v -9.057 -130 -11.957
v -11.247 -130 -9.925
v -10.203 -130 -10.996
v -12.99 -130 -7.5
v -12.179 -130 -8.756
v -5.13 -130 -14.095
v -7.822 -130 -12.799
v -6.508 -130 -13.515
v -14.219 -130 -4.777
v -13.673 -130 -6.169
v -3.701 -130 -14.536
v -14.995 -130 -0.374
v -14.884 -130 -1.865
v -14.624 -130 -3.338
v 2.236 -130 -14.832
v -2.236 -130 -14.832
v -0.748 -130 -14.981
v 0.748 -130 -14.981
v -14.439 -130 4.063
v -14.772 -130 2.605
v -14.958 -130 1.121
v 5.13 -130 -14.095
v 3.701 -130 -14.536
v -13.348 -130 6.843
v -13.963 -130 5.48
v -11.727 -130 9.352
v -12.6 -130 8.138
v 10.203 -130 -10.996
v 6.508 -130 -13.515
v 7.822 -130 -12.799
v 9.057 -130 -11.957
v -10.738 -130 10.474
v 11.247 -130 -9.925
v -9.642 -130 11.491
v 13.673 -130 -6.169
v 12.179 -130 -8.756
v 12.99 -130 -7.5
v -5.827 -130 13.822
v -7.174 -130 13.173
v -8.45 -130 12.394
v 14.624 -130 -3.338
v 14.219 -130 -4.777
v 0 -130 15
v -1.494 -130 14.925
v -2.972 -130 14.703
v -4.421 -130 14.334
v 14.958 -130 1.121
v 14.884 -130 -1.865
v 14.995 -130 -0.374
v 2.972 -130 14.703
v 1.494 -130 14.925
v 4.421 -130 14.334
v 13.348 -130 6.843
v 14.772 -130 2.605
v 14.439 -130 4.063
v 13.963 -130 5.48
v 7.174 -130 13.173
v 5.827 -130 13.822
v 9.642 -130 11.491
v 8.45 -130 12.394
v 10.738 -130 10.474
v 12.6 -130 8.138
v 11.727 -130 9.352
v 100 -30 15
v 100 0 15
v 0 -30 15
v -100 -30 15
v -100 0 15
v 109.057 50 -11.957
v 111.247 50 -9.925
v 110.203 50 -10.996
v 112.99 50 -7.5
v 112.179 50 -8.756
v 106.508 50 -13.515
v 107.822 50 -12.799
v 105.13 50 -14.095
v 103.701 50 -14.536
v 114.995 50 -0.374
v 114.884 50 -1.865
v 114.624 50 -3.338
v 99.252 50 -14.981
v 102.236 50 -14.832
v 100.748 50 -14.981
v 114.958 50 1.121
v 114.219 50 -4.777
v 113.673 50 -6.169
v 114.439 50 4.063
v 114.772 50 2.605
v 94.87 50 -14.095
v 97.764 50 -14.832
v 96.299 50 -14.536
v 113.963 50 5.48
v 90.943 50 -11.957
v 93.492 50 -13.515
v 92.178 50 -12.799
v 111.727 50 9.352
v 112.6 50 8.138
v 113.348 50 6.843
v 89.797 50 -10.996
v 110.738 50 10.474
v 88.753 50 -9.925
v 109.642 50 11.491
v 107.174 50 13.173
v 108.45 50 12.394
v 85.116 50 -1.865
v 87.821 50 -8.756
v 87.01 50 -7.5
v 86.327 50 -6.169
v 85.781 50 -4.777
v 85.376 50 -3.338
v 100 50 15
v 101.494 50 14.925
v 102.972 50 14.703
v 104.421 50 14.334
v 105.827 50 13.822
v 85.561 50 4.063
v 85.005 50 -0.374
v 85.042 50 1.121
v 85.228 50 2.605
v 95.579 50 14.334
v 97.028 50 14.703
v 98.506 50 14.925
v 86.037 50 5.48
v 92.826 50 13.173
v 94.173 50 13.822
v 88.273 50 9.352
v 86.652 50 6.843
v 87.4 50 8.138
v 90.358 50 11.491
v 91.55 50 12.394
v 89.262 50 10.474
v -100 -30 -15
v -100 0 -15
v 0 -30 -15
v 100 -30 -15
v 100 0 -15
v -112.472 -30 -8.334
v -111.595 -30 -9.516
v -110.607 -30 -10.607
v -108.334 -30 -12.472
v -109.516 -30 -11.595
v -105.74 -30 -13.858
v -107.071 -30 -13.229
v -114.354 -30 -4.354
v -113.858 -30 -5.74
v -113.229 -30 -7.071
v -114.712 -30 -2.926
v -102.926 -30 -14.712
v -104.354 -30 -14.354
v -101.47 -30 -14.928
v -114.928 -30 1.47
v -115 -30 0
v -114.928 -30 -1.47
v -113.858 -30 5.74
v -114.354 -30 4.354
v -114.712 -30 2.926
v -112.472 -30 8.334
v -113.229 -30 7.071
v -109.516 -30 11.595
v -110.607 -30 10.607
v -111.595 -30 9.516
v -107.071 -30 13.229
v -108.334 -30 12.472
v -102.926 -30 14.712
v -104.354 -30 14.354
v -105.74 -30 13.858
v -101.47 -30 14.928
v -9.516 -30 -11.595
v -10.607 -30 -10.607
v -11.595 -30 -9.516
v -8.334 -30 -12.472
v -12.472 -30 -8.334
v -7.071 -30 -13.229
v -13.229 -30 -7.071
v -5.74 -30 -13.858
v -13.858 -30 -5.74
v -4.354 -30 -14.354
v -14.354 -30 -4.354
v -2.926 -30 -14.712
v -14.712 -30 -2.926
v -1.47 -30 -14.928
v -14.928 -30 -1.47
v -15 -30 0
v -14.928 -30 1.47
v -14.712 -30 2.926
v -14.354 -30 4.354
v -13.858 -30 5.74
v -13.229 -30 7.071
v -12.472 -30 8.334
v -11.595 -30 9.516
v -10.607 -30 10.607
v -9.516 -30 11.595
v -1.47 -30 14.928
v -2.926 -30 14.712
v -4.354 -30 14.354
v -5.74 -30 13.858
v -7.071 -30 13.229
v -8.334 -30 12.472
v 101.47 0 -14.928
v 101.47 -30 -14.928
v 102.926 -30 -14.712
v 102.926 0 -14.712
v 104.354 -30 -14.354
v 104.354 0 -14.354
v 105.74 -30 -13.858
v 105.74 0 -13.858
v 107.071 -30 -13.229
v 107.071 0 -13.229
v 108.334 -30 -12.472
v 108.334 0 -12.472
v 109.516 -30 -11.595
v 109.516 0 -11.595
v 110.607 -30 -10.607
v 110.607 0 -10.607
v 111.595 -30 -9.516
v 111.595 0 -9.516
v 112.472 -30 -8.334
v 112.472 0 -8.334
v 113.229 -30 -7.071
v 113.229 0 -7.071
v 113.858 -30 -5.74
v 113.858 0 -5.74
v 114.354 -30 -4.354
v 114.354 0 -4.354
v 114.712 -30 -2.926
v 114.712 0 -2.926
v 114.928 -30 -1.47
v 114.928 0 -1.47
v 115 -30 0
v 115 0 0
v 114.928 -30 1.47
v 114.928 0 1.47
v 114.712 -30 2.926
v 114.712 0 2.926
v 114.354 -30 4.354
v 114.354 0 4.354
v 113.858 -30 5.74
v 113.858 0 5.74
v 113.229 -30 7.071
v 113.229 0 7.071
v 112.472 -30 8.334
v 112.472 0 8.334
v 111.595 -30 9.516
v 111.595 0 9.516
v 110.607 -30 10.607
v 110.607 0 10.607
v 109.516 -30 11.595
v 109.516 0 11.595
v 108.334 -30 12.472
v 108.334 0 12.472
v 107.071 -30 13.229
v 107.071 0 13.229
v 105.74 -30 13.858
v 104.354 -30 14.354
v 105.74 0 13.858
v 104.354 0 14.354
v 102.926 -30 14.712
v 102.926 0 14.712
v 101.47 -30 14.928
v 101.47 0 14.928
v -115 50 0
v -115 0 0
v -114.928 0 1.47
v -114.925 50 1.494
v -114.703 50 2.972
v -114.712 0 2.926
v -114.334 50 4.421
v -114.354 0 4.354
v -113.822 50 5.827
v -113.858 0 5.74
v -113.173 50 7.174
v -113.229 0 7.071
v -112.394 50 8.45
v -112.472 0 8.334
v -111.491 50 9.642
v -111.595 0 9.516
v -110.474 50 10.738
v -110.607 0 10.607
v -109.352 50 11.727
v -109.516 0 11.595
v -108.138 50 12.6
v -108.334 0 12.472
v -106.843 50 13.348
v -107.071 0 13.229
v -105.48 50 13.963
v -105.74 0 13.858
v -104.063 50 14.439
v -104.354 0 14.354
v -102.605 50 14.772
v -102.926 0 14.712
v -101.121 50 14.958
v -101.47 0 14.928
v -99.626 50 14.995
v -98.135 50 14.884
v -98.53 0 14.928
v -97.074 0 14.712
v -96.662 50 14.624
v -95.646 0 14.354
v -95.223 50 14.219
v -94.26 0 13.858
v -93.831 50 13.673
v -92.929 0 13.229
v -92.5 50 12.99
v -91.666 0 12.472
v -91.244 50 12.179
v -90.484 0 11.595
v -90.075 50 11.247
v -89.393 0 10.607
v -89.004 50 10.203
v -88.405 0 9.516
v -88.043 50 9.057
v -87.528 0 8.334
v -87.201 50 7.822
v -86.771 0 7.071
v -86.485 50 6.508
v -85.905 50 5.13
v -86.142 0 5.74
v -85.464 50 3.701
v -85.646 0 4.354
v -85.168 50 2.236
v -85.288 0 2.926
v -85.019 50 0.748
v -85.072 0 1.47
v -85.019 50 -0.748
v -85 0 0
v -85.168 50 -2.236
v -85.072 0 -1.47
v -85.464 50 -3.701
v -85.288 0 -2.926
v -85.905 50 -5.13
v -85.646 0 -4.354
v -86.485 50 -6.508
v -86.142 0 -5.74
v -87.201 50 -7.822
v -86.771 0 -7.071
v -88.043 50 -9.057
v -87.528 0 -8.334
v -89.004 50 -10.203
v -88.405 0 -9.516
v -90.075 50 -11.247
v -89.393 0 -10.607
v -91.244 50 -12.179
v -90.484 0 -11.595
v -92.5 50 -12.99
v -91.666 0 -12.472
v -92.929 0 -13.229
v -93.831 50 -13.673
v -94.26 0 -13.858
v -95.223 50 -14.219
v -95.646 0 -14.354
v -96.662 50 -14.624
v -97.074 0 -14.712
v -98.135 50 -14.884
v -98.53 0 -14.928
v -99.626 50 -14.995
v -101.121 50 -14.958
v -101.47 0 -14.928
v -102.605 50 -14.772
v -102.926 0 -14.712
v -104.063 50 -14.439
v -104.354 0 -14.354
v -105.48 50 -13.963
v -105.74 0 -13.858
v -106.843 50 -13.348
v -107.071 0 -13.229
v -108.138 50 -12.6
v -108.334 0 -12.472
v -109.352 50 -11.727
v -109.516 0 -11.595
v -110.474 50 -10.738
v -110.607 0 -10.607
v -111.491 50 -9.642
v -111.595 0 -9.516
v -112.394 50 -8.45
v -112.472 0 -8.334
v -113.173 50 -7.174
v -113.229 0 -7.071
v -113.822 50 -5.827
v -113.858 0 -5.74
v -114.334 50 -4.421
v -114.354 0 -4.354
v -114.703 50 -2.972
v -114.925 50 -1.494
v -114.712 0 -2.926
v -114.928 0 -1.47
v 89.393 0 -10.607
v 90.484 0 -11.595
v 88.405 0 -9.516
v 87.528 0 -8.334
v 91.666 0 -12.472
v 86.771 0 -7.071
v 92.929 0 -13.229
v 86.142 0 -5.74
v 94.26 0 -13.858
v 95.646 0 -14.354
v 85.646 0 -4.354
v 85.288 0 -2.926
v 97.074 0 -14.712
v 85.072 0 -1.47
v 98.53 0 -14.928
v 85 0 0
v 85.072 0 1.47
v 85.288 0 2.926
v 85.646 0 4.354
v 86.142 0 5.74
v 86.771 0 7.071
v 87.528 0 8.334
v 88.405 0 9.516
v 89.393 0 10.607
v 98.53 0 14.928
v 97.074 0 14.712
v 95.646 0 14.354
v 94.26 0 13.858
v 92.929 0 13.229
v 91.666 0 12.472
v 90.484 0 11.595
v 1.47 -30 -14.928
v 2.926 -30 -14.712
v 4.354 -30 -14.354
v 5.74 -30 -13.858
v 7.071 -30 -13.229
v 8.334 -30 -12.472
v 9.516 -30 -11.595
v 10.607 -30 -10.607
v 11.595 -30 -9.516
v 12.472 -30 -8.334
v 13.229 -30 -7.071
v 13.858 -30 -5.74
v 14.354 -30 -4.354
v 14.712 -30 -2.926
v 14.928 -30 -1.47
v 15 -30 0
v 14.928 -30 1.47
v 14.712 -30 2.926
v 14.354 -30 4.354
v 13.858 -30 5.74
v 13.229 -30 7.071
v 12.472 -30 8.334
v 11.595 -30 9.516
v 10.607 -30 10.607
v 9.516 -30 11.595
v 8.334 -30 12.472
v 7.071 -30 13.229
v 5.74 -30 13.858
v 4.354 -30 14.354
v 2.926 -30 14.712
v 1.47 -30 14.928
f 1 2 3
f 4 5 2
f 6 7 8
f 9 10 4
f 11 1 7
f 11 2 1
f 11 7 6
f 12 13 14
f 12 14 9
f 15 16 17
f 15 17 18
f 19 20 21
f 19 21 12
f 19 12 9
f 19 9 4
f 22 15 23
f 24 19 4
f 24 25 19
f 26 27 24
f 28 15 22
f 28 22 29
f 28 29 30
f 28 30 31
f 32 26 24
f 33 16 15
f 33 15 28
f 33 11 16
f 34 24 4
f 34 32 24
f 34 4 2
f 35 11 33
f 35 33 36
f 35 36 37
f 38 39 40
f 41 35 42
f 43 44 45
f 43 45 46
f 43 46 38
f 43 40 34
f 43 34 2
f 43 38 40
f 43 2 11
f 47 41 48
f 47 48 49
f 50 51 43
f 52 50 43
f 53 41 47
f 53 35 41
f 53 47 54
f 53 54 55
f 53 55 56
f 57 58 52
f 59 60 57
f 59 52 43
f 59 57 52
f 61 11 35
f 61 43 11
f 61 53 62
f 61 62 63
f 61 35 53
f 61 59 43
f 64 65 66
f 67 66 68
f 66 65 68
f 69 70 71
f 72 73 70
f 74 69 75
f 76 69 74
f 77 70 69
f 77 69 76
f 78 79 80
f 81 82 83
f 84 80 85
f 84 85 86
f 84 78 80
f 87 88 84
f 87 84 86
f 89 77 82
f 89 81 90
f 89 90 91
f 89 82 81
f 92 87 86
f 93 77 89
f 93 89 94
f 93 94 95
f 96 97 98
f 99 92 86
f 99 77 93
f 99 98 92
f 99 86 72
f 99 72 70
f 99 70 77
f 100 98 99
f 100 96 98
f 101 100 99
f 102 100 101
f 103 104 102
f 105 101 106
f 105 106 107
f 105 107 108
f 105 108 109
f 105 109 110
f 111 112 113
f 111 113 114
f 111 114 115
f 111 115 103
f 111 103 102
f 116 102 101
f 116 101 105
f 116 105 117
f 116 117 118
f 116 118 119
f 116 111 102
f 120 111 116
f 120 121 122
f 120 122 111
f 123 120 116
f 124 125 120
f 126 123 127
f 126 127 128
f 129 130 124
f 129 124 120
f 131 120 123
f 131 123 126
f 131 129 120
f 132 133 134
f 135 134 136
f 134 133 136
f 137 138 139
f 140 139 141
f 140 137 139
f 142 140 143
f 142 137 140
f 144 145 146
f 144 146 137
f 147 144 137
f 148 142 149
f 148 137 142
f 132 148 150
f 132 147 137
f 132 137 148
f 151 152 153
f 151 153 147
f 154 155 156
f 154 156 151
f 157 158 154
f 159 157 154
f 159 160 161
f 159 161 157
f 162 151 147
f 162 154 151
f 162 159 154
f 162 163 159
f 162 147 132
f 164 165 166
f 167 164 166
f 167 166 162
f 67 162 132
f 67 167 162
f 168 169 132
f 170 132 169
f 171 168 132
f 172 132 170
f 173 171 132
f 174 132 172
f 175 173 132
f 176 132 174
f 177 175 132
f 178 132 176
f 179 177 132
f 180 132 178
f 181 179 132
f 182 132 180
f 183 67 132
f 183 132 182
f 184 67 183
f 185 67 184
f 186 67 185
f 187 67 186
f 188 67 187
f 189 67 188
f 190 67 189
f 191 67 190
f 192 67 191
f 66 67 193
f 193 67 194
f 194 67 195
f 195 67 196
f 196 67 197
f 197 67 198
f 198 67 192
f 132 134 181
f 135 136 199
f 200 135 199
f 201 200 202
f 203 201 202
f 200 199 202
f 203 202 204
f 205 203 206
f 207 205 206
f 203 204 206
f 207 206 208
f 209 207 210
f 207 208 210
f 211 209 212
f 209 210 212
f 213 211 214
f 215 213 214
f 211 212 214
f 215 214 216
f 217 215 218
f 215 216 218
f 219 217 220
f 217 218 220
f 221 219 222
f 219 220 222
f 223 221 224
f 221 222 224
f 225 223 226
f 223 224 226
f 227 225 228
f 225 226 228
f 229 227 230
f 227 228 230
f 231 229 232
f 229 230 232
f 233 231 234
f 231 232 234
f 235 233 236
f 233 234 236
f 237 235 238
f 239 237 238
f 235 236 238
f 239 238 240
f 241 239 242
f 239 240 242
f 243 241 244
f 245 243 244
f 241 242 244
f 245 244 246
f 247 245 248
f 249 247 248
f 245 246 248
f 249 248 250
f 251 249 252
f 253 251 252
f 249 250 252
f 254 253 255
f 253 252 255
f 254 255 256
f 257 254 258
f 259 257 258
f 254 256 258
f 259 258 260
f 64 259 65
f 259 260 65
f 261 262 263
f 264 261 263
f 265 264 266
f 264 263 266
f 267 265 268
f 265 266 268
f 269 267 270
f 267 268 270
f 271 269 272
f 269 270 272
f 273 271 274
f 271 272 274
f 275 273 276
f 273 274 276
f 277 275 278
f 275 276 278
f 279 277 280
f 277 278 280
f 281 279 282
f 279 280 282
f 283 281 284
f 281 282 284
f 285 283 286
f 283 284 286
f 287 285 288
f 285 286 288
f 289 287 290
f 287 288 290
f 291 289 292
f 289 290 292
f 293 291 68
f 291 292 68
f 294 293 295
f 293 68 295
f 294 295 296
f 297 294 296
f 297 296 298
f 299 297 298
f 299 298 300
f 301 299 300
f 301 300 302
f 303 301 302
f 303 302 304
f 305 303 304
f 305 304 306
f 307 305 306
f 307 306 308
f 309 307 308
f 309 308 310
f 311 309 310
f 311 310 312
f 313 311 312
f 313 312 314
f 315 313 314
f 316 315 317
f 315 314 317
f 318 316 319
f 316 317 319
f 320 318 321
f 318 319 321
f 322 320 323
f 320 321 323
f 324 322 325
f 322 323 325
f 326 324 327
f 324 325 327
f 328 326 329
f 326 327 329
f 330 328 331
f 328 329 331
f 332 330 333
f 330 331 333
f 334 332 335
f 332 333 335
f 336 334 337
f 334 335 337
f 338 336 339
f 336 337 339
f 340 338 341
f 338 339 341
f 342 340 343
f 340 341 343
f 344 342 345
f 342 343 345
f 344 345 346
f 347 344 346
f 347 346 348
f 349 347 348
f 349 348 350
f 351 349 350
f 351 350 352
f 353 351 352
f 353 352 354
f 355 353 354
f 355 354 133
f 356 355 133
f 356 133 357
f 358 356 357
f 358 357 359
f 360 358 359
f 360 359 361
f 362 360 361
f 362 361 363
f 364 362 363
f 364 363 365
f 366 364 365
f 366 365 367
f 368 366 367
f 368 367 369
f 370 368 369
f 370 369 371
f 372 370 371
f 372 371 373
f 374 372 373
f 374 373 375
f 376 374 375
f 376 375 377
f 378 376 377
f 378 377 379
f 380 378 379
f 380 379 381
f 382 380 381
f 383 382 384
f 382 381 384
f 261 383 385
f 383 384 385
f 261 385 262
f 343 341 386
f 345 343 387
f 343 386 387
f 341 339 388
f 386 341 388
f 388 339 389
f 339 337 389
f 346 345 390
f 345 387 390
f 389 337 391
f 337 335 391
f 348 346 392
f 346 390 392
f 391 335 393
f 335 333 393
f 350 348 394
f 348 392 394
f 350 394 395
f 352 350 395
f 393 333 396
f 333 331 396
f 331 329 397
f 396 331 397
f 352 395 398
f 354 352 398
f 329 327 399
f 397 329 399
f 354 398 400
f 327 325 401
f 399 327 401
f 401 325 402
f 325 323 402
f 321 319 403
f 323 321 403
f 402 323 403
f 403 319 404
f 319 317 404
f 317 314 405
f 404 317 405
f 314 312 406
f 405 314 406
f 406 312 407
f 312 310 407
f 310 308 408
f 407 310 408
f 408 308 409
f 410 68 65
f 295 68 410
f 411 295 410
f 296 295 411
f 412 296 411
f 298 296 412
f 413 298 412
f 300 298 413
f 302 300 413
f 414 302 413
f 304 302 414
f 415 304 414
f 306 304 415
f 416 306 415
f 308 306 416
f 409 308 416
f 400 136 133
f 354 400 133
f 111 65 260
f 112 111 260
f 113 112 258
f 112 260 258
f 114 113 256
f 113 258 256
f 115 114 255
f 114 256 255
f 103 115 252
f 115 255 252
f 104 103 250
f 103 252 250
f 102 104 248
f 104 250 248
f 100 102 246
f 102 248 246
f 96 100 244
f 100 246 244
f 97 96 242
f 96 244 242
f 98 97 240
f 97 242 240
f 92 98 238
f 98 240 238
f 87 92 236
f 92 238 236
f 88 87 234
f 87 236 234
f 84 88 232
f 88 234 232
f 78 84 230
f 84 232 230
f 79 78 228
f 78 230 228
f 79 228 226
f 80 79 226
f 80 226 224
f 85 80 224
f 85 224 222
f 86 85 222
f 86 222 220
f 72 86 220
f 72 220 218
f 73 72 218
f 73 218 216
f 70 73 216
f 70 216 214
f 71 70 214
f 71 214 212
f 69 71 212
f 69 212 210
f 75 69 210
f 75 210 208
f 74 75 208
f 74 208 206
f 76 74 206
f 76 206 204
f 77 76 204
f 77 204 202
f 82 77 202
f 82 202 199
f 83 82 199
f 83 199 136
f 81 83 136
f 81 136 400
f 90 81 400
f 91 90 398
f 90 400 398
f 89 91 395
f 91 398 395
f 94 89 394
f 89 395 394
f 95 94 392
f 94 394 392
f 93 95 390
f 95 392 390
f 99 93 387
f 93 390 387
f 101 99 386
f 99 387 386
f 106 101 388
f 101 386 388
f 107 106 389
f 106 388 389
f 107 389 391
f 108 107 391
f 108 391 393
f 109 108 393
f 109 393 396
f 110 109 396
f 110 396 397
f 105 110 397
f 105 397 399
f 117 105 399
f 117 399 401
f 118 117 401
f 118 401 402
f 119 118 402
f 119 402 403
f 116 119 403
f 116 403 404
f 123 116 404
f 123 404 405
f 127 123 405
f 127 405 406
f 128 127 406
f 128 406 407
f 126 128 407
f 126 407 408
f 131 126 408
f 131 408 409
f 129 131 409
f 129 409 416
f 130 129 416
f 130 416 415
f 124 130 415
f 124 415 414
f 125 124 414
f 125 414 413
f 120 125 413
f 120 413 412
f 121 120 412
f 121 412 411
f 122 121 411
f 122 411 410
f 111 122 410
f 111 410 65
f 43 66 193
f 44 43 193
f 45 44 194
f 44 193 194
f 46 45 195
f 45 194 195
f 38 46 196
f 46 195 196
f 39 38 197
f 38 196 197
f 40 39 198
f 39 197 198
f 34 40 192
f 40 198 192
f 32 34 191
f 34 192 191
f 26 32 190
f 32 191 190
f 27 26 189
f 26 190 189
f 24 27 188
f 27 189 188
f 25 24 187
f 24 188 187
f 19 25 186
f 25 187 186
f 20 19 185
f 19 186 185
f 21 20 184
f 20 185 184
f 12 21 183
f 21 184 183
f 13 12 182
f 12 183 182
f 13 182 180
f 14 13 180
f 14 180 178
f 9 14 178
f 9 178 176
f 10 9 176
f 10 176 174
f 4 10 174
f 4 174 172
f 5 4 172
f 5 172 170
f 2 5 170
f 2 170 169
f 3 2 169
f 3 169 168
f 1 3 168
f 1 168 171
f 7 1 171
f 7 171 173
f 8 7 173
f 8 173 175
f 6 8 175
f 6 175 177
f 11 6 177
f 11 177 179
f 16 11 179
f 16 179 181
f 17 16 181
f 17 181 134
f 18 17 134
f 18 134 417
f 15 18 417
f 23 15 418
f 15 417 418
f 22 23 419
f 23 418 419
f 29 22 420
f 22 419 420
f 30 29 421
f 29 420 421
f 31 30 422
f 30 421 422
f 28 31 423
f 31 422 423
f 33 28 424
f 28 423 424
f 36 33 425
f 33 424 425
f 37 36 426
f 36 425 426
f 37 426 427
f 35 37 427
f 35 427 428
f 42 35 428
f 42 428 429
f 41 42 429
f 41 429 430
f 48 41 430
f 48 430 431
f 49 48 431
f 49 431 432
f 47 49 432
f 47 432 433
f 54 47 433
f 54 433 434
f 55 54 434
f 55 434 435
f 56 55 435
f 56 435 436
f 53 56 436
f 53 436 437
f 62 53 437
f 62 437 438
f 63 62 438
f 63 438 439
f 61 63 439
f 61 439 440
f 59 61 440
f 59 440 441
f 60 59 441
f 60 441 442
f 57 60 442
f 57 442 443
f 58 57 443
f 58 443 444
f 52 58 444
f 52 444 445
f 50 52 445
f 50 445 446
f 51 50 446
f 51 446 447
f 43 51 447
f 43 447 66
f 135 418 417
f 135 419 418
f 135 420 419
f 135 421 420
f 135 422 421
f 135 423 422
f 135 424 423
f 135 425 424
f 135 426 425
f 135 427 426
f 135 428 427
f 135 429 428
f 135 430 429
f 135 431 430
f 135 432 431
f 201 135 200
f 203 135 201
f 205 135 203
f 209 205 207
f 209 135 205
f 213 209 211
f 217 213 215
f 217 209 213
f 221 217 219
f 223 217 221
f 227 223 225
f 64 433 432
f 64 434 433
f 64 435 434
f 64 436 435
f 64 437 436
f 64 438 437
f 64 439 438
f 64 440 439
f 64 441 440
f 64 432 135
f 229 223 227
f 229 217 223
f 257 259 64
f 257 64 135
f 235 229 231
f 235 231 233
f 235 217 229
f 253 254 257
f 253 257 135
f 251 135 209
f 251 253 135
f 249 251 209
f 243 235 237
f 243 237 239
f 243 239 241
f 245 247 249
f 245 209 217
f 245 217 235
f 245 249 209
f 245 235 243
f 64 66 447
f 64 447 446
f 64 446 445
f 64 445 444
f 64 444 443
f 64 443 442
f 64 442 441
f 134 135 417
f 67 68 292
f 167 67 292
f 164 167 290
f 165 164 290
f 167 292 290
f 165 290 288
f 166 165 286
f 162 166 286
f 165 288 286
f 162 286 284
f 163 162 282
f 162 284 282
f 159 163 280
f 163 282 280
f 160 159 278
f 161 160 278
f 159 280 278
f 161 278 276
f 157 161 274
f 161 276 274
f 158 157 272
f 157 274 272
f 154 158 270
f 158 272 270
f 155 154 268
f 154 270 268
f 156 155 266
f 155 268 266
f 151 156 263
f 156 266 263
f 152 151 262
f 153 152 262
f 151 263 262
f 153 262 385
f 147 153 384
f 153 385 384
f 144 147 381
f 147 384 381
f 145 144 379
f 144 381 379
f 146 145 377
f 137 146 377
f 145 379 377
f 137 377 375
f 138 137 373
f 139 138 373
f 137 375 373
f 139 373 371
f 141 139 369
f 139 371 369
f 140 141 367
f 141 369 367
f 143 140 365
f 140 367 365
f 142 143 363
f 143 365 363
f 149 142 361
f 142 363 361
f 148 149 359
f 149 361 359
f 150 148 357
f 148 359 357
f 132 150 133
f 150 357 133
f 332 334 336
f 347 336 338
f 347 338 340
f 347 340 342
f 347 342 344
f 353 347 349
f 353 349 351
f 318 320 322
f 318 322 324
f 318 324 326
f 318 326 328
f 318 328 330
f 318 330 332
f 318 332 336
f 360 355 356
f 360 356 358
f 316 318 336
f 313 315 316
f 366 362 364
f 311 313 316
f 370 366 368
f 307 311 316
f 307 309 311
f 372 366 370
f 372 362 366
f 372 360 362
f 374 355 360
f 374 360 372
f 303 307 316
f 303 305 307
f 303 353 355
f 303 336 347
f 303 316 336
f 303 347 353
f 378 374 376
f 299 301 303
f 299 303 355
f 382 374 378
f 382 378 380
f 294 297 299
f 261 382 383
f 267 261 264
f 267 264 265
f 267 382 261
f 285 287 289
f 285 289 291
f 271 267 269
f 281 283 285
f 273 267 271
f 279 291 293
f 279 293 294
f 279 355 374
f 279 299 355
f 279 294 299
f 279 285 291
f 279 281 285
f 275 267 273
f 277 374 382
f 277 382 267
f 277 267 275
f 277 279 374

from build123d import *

# Parameters (mm, degrees)
F1_DEPTH = 30
F3_DEPTH = 100
F5_DEPTH = 50


with BuildPart() as f1:
    # F0 (on Front) → F1 (new body)
    with BuildSketch(Plane.XZ):
        with BuildLine():
            Line((100, 15), (-100, 15))
            ThreePointArc((-100, 15), (-115, 0), (-100, -15))
            Line((-100, -15), (100, -15))
            ThreePointArc((100, -15), (115, 0), (100, 15))
        make_face()
    extrude(amount=F1_DEPTH)

    # F2 (on face) → F3 (join)
    with BuildSketch(Plane.XZ.offset(30)):
        with BuildLine():
            ThreePointArc((3.16e-08, -15), (10.606601729, -10.6066017066), (15, 0))
            ThreePointArc((15, 0), (10.6066017178, 10.6066017178), (0, 15))
            ThreePointArc((0, 15), (-15, -1.58e-08), (3.16e-08, -15))
        make_face()
    extrude(amount=F3_DEPTH)

    # F4 (on face) → F5 (join)
    with BuildSketch(Plane(origin=(0, 0, 0), x_dir=(-1, 0, 0), z_dir=(0, 1, 0))):
        with BuildLine():
            ThreePointArc((-100, -15), (-89.3933982822, -10.6066017178), (-85, 0))
            ThreePointArc((-85, 0), (-89.3933982822, 10.6066017178), (-100, 15))
            ThreePointArc((-100, 15), (-115, 0), (-100, -15))
        make_face()
        with BuildLine():
            ThreePointArc((100, 15), (89.3933982822, 10.6066017178), (85, 0))
            ThreePointArc((85, 0), (89.3933982822, -10.6066017178), (100, -15))
            ThreePointArc((100, -15), (110.6066017178, -10.6066017178), (115, 0))
            ThreePointArc((115, 0), (110.6066017178, 10.6066017178), (100, 15))
        make_face()
    extrude(amount=F5_DEPTH)


solid = f1.part
